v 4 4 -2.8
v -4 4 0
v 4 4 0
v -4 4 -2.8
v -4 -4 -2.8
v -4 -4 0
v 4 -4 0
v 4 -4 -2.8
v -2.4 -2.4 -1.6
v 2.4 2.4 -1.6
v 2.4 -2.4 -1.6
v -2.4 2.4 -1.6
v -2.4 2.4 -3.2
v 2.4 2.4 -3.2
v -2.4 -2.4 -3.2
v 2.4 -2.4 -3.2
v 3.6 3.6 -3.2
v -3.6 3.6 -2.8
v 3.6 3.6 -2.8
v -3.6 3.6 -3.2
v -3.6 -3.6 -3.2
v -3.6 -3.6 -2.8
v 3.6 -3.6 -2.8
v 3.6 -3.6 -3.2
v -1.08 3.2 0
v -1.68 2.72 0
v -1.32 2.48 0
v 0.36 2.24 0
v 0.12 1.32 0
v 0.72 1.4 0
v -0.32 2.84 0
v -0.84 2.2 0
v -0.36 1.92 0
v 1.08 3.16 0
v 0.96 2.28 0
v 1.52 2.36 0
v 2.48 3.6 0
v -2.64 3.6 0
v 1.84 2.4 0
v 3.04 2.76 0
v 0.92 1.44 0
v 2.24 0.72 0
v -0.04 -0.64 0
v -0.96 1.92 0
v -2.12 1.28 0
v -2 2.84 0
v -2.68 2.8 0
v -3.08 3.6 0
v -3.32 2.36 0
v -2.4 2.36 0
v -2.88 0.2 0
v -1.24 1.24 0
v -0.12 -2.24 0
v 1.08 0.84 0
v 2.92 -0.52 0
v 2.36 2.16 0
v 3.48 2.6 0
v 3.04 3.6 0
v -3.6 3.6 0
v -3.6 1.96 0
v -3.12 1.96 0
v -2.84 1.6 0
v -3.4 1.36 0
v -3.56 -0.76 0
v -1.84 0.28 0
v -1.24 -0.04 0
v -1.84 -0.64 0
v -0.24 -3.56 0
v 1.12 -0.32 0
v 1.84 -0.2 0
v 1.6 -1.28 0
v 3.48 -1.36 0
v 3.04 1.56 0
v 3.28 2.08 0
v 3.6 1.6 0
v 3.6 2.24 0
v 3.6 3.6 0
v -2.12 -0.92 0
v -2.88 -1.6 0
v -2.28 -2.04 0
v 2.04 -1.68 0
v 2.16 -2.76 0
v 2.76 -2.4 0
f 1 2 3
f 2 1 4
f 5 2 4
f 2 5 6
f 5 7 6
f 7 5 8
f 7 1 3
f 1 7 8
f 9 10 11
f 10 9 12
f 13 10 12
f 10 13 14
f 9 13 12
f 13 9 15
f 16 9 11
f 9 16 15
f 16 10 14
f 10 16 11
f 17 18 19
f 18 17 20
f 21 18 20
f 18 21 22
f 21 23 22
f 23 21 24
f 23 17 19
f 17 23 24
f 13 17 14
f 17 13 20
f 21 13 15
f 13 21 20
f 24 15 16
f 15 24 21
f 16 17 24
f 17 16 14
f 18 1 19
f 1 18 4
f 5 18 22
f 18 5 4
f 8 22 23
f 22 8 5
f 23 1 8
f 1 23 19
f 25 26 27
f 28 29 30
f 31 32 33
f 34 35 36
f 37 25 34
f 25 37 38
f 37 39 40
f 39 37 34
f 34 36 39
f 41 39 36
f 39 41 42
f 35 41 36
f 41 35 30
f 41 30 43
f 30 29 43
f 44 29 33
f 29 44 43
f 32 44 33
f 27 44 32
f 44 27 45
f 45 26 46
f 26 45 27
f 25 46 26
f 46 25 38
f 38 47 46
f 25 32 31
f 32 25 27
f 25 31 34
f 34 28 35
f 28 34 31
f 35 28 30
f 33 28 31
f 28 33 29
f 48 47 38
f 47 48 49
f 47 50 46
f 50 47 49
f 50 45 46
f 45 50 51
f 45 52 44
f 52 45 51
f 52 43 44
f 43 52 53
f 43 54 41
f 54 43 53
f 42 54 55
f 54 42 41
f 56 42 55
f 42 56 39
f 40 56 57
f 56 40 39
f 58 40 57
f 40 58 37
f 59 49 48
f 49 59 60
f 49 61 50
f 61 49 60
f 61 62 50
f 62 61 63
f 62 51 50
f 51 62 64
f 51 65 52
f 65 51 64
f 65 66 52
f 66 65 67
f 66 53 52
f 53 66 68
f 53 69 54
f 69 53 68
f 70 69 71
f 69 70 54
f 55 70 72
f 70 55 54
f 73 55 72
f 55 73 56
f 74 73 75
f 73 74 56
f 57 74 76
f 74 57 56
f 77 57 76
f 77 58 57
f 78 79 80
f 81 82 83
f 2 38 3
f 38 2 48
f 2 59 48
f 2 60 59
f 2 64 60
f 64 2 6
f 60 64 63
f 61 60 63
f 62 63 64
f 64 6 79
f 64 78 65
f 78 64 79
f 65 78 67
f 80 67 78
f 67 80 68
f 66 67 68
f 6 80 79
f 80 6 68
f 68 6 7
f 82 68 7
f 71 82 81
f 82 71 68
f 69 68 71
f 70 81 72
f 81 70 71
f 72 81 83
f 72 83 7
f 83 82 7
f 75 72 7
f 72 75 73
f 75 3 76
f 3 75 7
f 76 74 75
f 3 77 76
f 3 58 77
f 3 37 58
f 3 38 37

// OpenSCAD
// file: ../p/box5.scad
use <../lib.scad>
function ldraw_lib__box5() = [
// 0 Box with 5 Faces and All Edges
// 0 Name: box5.dat
// 0 Author: James Jessiman
// 0 !LDRAW_ORG Primitive UPDATE 2012-01
// 0 !LICENSE Licensed under CC BY 4.0 : see CAreadme.txt
// 
// 0 BFC CERTIFY CCW
  [0,"BFC","CERTIFY"],
  [0,"BFC","CCW"],
// 
// 0 !HISTORY 2002-04-03 [sbliss] Modified for BFC compliance
// 0 !HISTORY 2002-04-25 [PTadmin] Official Update 2002-02
// 0 !HISTORY 2007-06-24 [PTadmin] Header formatted for Contributor Agreement
// 0 !HISTORY 2008-07-01 [PTadmin] Official Update 2008-01
// 0 !HISTORY 2012-02-16 [Philo] Changed to CCW
// 0 !HISTORY 2012-03-30 [PTadmin] Official Update 2012-01
// 
// 
// 2 24 1 1 1 -1 1 1
  [2,24,1,1,1,-1,1,1],
// 2 24 -1 1 1 -1 1 -1
  [2,24,-1,1,1,-1,1,-1],
// 2 24 -1 1 -1 1 1 -1
  [2,24,-1,1,-1,1,1,-1],
// 2 24 1 1 -1 1 1 1
  [2,24,1,1,-1,1,1,1],
// 2 24 1 0 1 -1 0 1
  [2,24,1,0,1,-1,0,1],
// 2 24 -1 0 1 -1 0 -1
  [2,24,-1,0,1,-1,0,-1],
// 2 24 -1 0 -1 1 0 -1
  [2,24,-1,0,-1,1,0,-1],
// 2 24 1 0 -1 1 0 1
  [2,24,1,0,-1,1,0,1],
// 2 24 1 0 1 1 1 1
  [2,24,1,0,1,1,1,1],
// 2 24 -1 0 1 -1 1 1
  [2,24,-1,0,1,-1,1,1],
// 2 24 1 0 -1 1 1 -1
  [2,24,1,0,-1,1,1,-1],
// 2 24 -1 0 -1 -1 1 -1
  [2,24,-1,0,-1,-1,1,-1],
// 4 16 -1 1 1 1 1 1 1 1 -1 -1 1 -1
  [4,16,-1,1,1,1,1,1,1,1,-1,-1,1,-1],
// 4 16 -1 1 1 -1 0 1 1 0 1 1 1 1
  [4,16,-1,1,1,-1,0,1,1,0,1,1,1,1],
// 4 16 -1 1 -1 -1 0 -1 -1 0 1 -1 1 1
  [4,16,-1,1,-1,-1,0,-1,-1,0,1,-1,1,1],
// 4 16 1 1 -1 1 0 -1 -1 0 -1 -1 1 -1
  [4,16,1,1,-1,1,0,-1,-1,0,-1,-1,1,-1],
// 4 16 1 1 1 1 0 1 1 0 -1 1 1 -1
  [4,16,1,1,1,1,0,1,1,0,-1,1,1,-1],
];
module ldraw_lib__box5(step=0, col=false, unit=2/5, alt=false, line=0.2, solid=!$preview)
    makepoly(ldraw_lib__box5(), step=step, col=col, unit=unit, alt=alt, line=line, solid=solid);
ldraw_lib__box5(line=0.2);
// file: ../p/box4.scad
use <../lib.scad>
function ldraw_lib__box4() = [
// 0 Box with 4 Faces (2 Parallel Pairs) and All Edges
// 0 Name: box4.dat
// 0 Author: James Jessiman
// 0 !LDRAW_ORG Primitive UPDATE 2012-01
// 0 !LICENSE Licensed under CC BY 4.0 : see CAreadme.txt
// 
// 0 BFC CERTIFY CCW
  [0,"BFC","CERTIFY"],
  [0,"BFC","CCW"],
// 
// 0 !HISTORY 2002-04-03 [sbliss] Modified for BFC compliance
// 0 !HISTORY 2002-04-25 [PTadmin] Official Update 2002-02
// 0 !HISTORY 2007-06-24 [PTadmin] Header formatted for Contributor Agreement
// 0 !HISTORY 2008-07-01 [PTadmin] Official Update 2008-01
// 0 !HISTORY 2012-02-16 [Philo] Changed to CCW
// 0 !HISTORY 2012-03-30 [PTadmin] Official Update 2012-01
// 
// 
// 2 24 1 1 1 -1 1 1
  [2,24,1,1,1,-1,1,1],
// 2 24 -1 1 1 -1 1 -1
  [2,24,-1,1,1,-1,1,-1],
// 2 24 -1 1 -1 1 1 -1
  [2,24,-1,1,-1,1,1,-1],
// 2 24 1 1 -1 1 1 1
  [2,24,1,1,-1,1,1,1],
// 2 24 1 0 1 -1 0 1
  [2,24,1,0,1,-1,0,1],
// 2 24 -1 0 1 -1 0 -1
  [2,24,-1,0,1,-1,0,-1],
// 2 24 -1 0 -1 1 0 -1
  [2,24,-1,0,-1,1,0,-1],
// 2 24 1 0 -1 1 0 1
  [2,24,1,0,-1,1,0,1],
// 2 24 1 0 1 1 1 1
  [2,24,1,0,1,1,1,1],
// 2 24 -1 0 1 -1 1 1
  [2,24,-1,0,1,-1,1,1],
// 2 24 1 0 -1 1 1 -1
  [2,24,1,0,-1,1,1,-1],
// 2 24 -1 0 -1 -1 1 -1
  [2,24,-1,0,-1,-1,1,-1],
// 4 16 -1 1 1 -1 0 1 1 0 1 1 1 1
  [4,16,-1,1,1,-1,0,1,1,0,1,1,1,1],
// 4 16 -1 1 -1 -1 0 -1 -1 0 1 -1 1 1
  [4,16,-1,1,-1,-1,0,-1,-1,0,1,-1,1,1],
// 4 16 1 1 -1 1 0 -1 -1 0 -1 -1 1 -1
  [4,16,1,1,-1,1,0,-1,-1,0,-1,-1,1,-1],
// 4 16 1 1 1 1 0 1 1 0 -1 1 1 -1
  [4,16,1,1,1,1,0,1,1,0,-1,1,1,-1],
];
module ldraw_lib__box4(step=0, col=false, unit=2/5, alt=false, line=0.2, solid=!$preview)
    makepoly(ldraw_lib__box4(), step=step, col=col, unit=unit, alt=alt, line=line, solid=solid);
ldraw_lib__box4(line=0.2);
// file: s/3070bs01.scad
use <../../lib.scad>
use <../../p/box4.scad>
use <../../p/box5.scad>
function ldraw_lib__s__3070bs01() = [
// 0 ~Tile  1 x  1 with Groove without Top Face
// 0 Name: s\3070bs01.dat
// 0 Author: Chris Dee [cwdee]
// 0 !LDRAW_ORG Subpart UPDATE 2009-02
// 0 !LICENSE Licensed under CC BY 4.0 : see CAreadme.txt
// 
// 0 BFC CERTIFY CCW
  [0,"BFC","CERTIFY"],
  [0,"BFC","CCW"],
// 
// 0 !HISTORY 2009-09-03 [PTadmin] Official Update 2009-02
// 
// 
// 1 16 0 0 0 10 0 0 0 7 0 0 0 10 box4.dat
  [1,16,0,0,0,10,0,0,0,7,0,0,0,10, ldraw_lib__box4()],
// 0 BFC INVERTNEXT
  [0,"BFC","INVERTNEXT"],
// 1 16 0 8 0 6 0 0 0 -4 0 0 0 6 box5.dat
  [1,16,0,8,0,6,0,0,0,-4,0,0,0,6, ldraw_lib__box5()],
// 1 16 0 7 0 9 0 0 0 1 0 0 0 9 box4.dat
  [1,16,0,7,0,9,0,0,0,1,0,0,0,9, ldraw_lib__box4()],
// 
// 4 16 9 8 9 6 8 6 -6 8 6 -9 8 9
  [4,16,9,8,9,6,8,6,-6,8,6,-9,8,9],
// 4 16 -9 8 9 -6 8 6 -6 8 -6 -9 8 -9
  [4,16,-9,8,9,-6,8,6,-6,8,-6,-9,8,-9],
// 4 16 -9 8 -9 -6 8 -6 6 8 -6 9 8 -9
  [4,16,-9,8,-9,-6,8,-6,6,8,-6,9,8,-9],
// 4 16 9 8 -9 6 8 -6 6 8 6 9 8 9
  [4,16,9,8,-9,6,8,-6,6,8,6,9,8,9],
// 
// 4 16 10 7 10 9 7 9 -9 7 9 -10 7 10
  [4,16,10,7,10,9,7,9,-9,7,9,-10,7,10],
// 4 16 -10 7 10 -9 7 9 -9 7 -9 -10 7 -10
  [4,16,-10,7,10,-9,7,9,-9,7,-9,-10,7,-10],
// 4 16 -10 7 -10 -9 7 -9 9 7 -9 10 7 -10
  [4,16,-10,7,-10,-9,7,-9,9,7,-9,10,7,-10],
// 4 16 10 7 -10 9 7 -9 9 7 9 10 7 10
  [4,16,10,7,-10,9,7,-9,9,7,9,10,7,10],
// 0
];
module ldraw_lib__s__3070bs01(step=0, col=false, unit=2/5, alt=false, line=0.2, solid=!$preview)
    makepoly(ldraw_lib__s__3070bs01(), step=step, col=col, unit=unit, alt=alt, line=line, solid=solid);
ldraw_lib__s__3070bs01(line=0.2);
// main file
use <../lib.scad>
use <s/3070bs01.scad>
function ldraw_lib__3070bp1b() = [
// 0 Tile  1 x  1 with Metallic Pink, White, and Yellow Explosion Pattern
// 0 Name: 3070bp1b.dat
// 0 Author: Takeshi Takahashi [RainbowDolphin]
// 0 !LDRAW_ORG Part UPDATE 2023-03
// 0 !LICENSE Licensed under CC BY 4.0 : see CAreadme.txt
// 
// 0 BFC CERTIFY CCW
  [0,"BFC","CERTIFY"],
  [0,"BFC","CCW"],
// 
// 0 !KEYWORDS bracelet, Bricklink 3070bpb165, Dots, Power, Set 41919
// 
// 0 !HISTORY 2023-06-24 [OrionP] Official Update 2023-03
// 
// 
// 1 16 0 0 0 1 0 0 0 1 0 0 0 1 s\3070bs01.dat
  [1,16,0,0,0,1,0,0,0,1,0,0,0,1, ldraw_lib__s__3070bs01()],
// 3 15 -2.7 0 8 -4.2 0 6.8 -3.3 0 6.2
  [3,15,-2.7,0,8,-4.2,0,6.8,-3.3,0,6.2],
// 3 15 0.9 0 5.6 0.3 0 3.3 1.8 0 3.5
  [3,15,0.9,0,5.6,0.3,0,3.3,1.8,0,3.5],
// 3 353 -0.8 0 7.1 -2.1 0 5.5 -0.9 0 4.8
  [3,353,-0.8,0,7.1,-2.1,0,5.5,-0.9,0,4.8],
// 3 353 2.7 0 7.9 2.4 0 5.7 3.8 0 5.9
  [3,353,2.7,0,7.9,2.4,0,5.7,3.8,0,5.9],
// 4 14 6.2 0 9 -6.6 0 9 -2.7 0 8 2.7 0 7.9
  [4,14,6.2,0,9,-6.6,0,9,-2.7,0,8,2.7,0,7.9],
// 4 14 7.6 0 6.9 6.2 0 9 2.7 0 7.9 4.6 0 6
  [4,14,7.6,0,6.9,6.2,0,9,2.7,0,7.9,4.6,0,6],
// 3 14 2.7 0 7.9 3.8 0 5.9 4.6 0 6
  [3,14,2.7,0,7.9,3.8,0,5.9,4.6,0,6],
// 4 14 5.6 0 1.8 4.6 0 6 3.8 0 5.9 2.3 0 3.6
  [4,14,5.6,0,1.8,4.6,0,6,3.8,0,5.9,2.3,0,3.6],
// 4 14 2.3 0 3.6 3.8 0 5.9 2.4 0 5.7 1.8 0 3.5
  [4,14,2.3,0,3.6,3.8,0,5.9,2.4,0,5.7,1.8,0,3.5],
// 3 14 2.3 0 3.6 1.8 0 3.5 -0.1 0 -1.6
  [3,14,2.3,0,3.6,1.8,0,3.5,-0.1,0,-1.6],
// 3 14 1.8 0 3.5 0.3 0 3.3 -0.1 0 -1.6
  [3,14,1.8,0,3.5,0.3,0,3.3,-0.1,0,-1.6],
// 4 14 -0.1 0 -1.6 0.3 0 3.3 -0.9 0 4.8 -2.4 0 4.8
  [4,14,-0.1,0,-1.6,0.3,0,3.3,-0.9,0,4.8,-2.4,0,4.8],
// 3 14 -2.1 0 5.5 -2.4 0 4.8 -0.9 0 4.8
  [3,14,-2.1,0,5.5,-2.4,0,4.8,-0.9,0,4.8],
// 4 14 -2.4 0 4.8 -2.1 0 5.5 -3.3 0 6.2 -5.3 0 3.2
  [4,14,-2.4,0,4.8,-2.1,0,5.5,-3.3,0,6.2,-5.3,0,3.2],
// 4 14 -5.3 0 3.2 -3.3 0 6.2 -4.2 0 6.8 -5 0 7.1
  [4,14,-5.3,0,3.2,-3.3,0,6.2,-4.2,0,6.8,-5,0,7.1],
// 4 14 -5 0 7.1 -4.2 0 6.8 -2.7 0 8 -6.6 0 9
  [4,14,-5,0,7.1,-4.2,0,6.8,-2.7,0,8,-6.6,0,9],
// 3 14 -6.6 0 9 -6.7 0 7 -5 0 7.1
  [3,14,-6.6,0,9,-6.7,0,7,-5,0,7.1],
// 4 14 -2.7 0 8 -3.3 0 6.2 -2.1 0 5.5 -0.8 0 7.1
  [4,14,-2.7,0,8,-3.3,0,6.2,-2.1,0,5.5,-0.8,0,7.1],
// 3 14 -2.7 0 8 -0.8 0 7.1 2.7 0 7.9
  [3,14,-2.7,0,8,-0.8,0,7.1,2.7,0,7.9],
// 4 14 2.7 0 7.9 -0.8 0 7.1 0.9 0 5.6 2.4 0 5.7
  [4,14,2.7,0,7.9,-0.8,0,7.1,0.9,0,5.6,2.4,0,5.7],
// 3 14 2.4 0 5.7 0.9 0 5.6 1.8 0 3.5
  [3,14,2.4,0,5.7,0.9,0,5.6,1.8,0,3.5],
// 4 14 0.9 0 5.6 -0.8 0 7.1 -0.9 0 4.8 0.3 0 3.3
  [4,14,0.9,0,5.6,-0.8,0,7.1,-0.9,0,4.8,0.3,0,3.3],
// 4 15 -6.7 0 7 -6.6 0 9 -7.7 0 9 -8.3 0 5.9
  [4,15,-6.7,0,7,-6.6,0,9,-7.7,0,9,-8.3,0,5.9],
// 4 15 -6.7 0 7 -8.3 0 5.9 -6 0 5.9 -5 0 7.1
  [4,15,-6.7,0,7,-8.3,0,5.9,-6,0,5.9,-5,0,7.1],
// 4 15 -5.3 0 3.2 -5 0 7.1 -6 0 5.9 -7.2 0 0.5
  [4,15,-5.3,0,3.2,-5,0,7.1,-6,0,5.9,-7.2,0,0.5],
// 4 15 -5.3 0 3.2 -7.2 0 0.5 -3.1 0 3.1 -2.4 0 4.8
  [4,15,-5.3,0,3.2,-7.2,0,0.5,-3.1,0,3.1,-2.4,0,4.8],
// 4 15 -0.1 0 -1.6 -2.4 0 4.8 -3.1 0 3.1 -0.3 0 -5.6
  [4,15,-0.1,0,-1.6,-2.4,0,4.8,-3.1,0,3.1,-0.3,0,-5.6],
// 4 15 -0.1 0 -1.6 -0.3 0 -5.6 2.7 0 2.1 2.3 0 3.6
  [4,15,-0.1,0,-1.6,-0.3,0,-5.6,2.7,0,2.1,2.3,0,3.6],
// 4 15 5.6 0 1.8 2.3 0 3.6 2.7 0 2.1 7.3 0 -1.3
  [4,15,5.6,0,1.8,2.3,0,3.6,2.7,0,2.1,7.3,0,-1.3],
// 4 15 5.6 0 1.8 7.3 0 -1.3 5.9 0 5.4 4.6 0 6
  [4,15,5.6,0,1.8,7.3,0,-1.3,5.9,0,5.4,4.6,0,6],
// 4 15 7.6 0 6.9 4.6 0 6 5.9 0 5.4 8.7 0 6.5
  [4,15,7.6,0,6.9,4.6,0,6,5.9,0,5.4,8.7,0,6.5],
// 4 15 7.6 0 6.9 8.7 0 6.5 7.6 0 9 6.2 0 9
  [4,15,7.6,0,6.9,8.7,0,6.5,7.6,0,9,6.2,0,9],
// 4 10049 -8.3 0 5.9 -7.7 0 9 -9 0 9 -9 0 4.9
  [4,10049,-8.3,0,5.9,-7.7,0,9,-9,0,9,-9,0,4.9],
// 4 10049 -8.3 0 5.9 -9 0 4.9 -7.8 0 4.9 -6 0 5.9
  [4,10049,-8.3,0,5.9,-9,0,4.9,-7.8,0,4.9,-6,0,5.9],
// 4 10049 -7.1 0 4 -6 0 5.9 -7.8 0 4.9 -8.5 0 3.4
  [4,10049,-7.1,0,4,-6,0,5.9,-7.8,0,4.9,-8.5,0,3.4],
// 4 10049 -7.2 0 .5 -6 0 5.9 -7.1 0 4 -8.9 0 -1.9
  [4,10049,-7.2,0,.5,-6,0,5.9,-7.1,0,4,-8.9,0,-1.9],
// 4 10049 -7.2 0 .5 -8.9 0 -1.9 -4.6 0 .7 -3.1 0 3.1
  [4,10049,-7.2,0,.5,-8.9,0,-1.9,-4.6,0,.7,-3.1,0,3.1],
// 4 10049 -3.1 0 -.1 -3.1 0 3.1 -4.6 0 .7 -4.6 0 -1.6
  [4,10049,-3.1,0,-.1,-3.1,0,3.1,-4.6,0,.7,-4.6,0,-1.6],
// 4 10049 -.3 0 -5.6 -3.1 0 3.1 -3.1 0 -.1 -.6 0 -8.9
  [4,10049,-.3,0,-5.6,-3.1,0,3.1,-3.1,0,-.1,-.6,0,-8.9],
// 4 10049 -.3 0 -5.6 -.6 0 -8.9 2.8 0 -.8 2.7 0 2.1
  [4,10049,-.3,0,-5.6,-.6,0,-8.9,2.8,0,-.8,2.7,0,2.1],
// 4 10049 4.6 0 -.5 2.7 0 2.1 2.8 0 -.8 4 0 -3.2
  [4,10049,4.6,0,-.5,2.7,0,2.1,2.8,0,-.8,4,0,-3.2],
// 4 10049 7.3 0 -1.3 2.7 0 2.1 4.6 0 -.5 8.7 0 -3.4
  [4,10049,7.3,0,-1.3,2.7,0,2.1,4.6,0,-.5,8.7,0,-3.4],
// 4 10049 7.3 0 -1.3 8.7 0 -3.4 7.6 0 3.9 5.9 0 5.4
  [4,10049,7.3,0,-1.3,8.7,0,-3.4,7.6,0,3.9,5.9,0,5.4],
// 4 10049 8.2 0 5.2 5.9 0 5.4 7.6 0 3.9 9 0 4
  [4,10049,8.2,0,5.2,5.9,0,5.4,7.6,0,3.9,9,0,4],
// 4 10049 8.7 0 6.5 5.9 0 5.4 8.2 0 5.2 9 0 5.6
  [4,10049,8.7,0,6.5,5.9,0,5.4,8.2,0,5.2,9,0,5.6],
// 3 10049 9 0 9 8.7 0 6.5 9 0 5.6
  [3,10049,9,0,9,8.7,0,6.5,9,0,5.6],
// 3 10049 9 0 9 7.6 0 9 8.7 0 6.5
  [3,10049,9,0,9,7.6,0,9,8.7,0,6.5],
// 3 10049 -5.3 0 -2.3 -7.2 0 -4 -5.7 0 -5.1
  [3,10049,-5.3,0,-2.3,-7.2,0,-4,-5.7,0,-5.1],
// 3 10049 5.1 0 -4.2 5.4 0 -6.9 6.9 0 -6
  [3,10049,5.1,0,-4.2,5.4,0,-6.9,6.9,0,-6],
// 4 16 -6.6 0 9 10 0 10 -10 0 10 -7.7 0 9
  [4,16,-6.6,0,9,10,0,10,-10,0,10,-7.7,0,9],
// 3 16 -10 0 10 -9 0 9 -7.7 0 9
  [3,16,-10,0,10,-9,0,9,-7.7,0,9],
// 3 16 -10 0 10 -9 0 4.9 -9 0 9
  [3,16,-10,0,10,-9,0,4.9,-9,0,9],
// 4 16 -8.9 0 -1.9 -9 0 4.9 -10 0 10 -10 0 -10
  [4,16,-8.9,0,-1.9,-9,0,4.9,-10,0,10,-10,0,-10],
// 3 16 -9 0 4.9 -8.9 0 -1.9 -8.5 0 3.4
  [3,16,-9,0,4.9,-8.9,0,-1.9,-8.5,0,3.4],
// 3 16 -7.8 0 4.9 -9 0 4.9 -8.5 0 3.4
  [3,16,-7.8,0,4.9,-9,0,4.9,-8.5,0,3.4],
// 3 16 -7.1 0 4 -8.5 0 3.4 -8.9 0 -1.9
  [3,16,-7.1,0,4,-8.5,0,3.4,-8.9,0,-1.9],
// 3 16 -8.9 0 -1.9 -10 0 -10 -7.2 0 -4
  [3,16,-8.9,0,-1.9,-10,0,-10,-7.2,0,-4],
// 4 16 -8.9 0 -1.9 -7.2 0 -4 -5.3 0 -2.3 -4.6 0 0.7
  [4,16,-8.9,0,-1.9,-7.2,0,-4,-5.3,0,-2.3,-4.6,0,0.7],
// 3 16 -4.6 0 0.7 -5.3 0 -2.3 -4.6 0 -1.6
  [3,16,-4.6,0,0.7,-5.3,0,-2.3,-4.6,0,-1.6],
// 4 16 -0.6 0 -8.9 -4.6 0 -1.6 -5.3 0 -2.3 -5.7 0 -5.1
  [4,16,-0.6,0,-8.9,-4.6,0,-1.6,-5.3,0,-2.3,-5.7,0,-5.1],
// 3 16 -3.1 0 -0.1 -4.6 0 -1.6 -0.6 0 -8.9
  [3,16,-3.1,0,-0.1,-4.6,0,-1.6,-0.6,0,-8.9],
// 4 16 -10 0 -10 -0.6 0 -8.9 -5.7 0 -5.1 -7.2 0 -4
  [4,16,-10,0,-10,-0.6,0,-8.9,-5.7,0,-5.1,-7.2,0,-4],
// 3 16 -0.6 0 -8.9 -10 0 -10 10 0 -10
  [3,16,-0.6,0,-8.9,-10,0,-10,10,0,-10],
// 3 16 5.4 0 -6.9 -0.6 0 -8.9 10 0 -10
  [3,16,5.4,0,-6.9,-0.6,0,-8.9,10,0,-10],
// 4 16 -0.6 0 -8.9 5.4 0 -6.9 5.1 0 -4.2 4 0 -3.2
  [4,16,-0.6,0,-8.9,5.4,0,-6.9,5.1,0,-4.2,4,0,-3.2],
// 3 16 2.8 0 -0.8 -0.6 0 -8.9 4 0 -3.2
  [3,16,2.8,0,-0.8,-0.6,0,-8.9,4,0,-3.2],
// 4 16 4.6 0 -0.5 4 0 -3.2 5.1 0 -4.2 8.7 0 -3.4
  [4,16,4.6,0,-0.5,4,0,-3.2,5.1,0,-4.2,8.7,0,-3.4],
// 3 16 8.7 0 -3.4 5.1 0 -4.2 6.9 0 -6
  [3,16,8.7,0,-3.4,5.1,0,-4.2,6.9,0,-6],
// 3 16 8.7 0 -3.4 6.9 0 -6 10 0 -10
  [3,16,8.7,0,-3.4,6.9,0,-6,10,0,-10],
// 3 16 6.9 0 -6 5.4 0 -6.9 10 0 -10
  [3,16,6.9,0,-6,5.4,0,-6.9,10,0,-10],
// 4 16 8.7 0 -3.4 10 0 -10 9 0 4 7.6 0 3.9
  [4,16,8.7,0,-3.4,10,0,-10,9,0,4,7.6,0,3.9],
// 4 16 9 0 4 10 0 -10 10 0 10 9 0 5.6
  [4,16,9,0,4,10,0,-10,10,0,10,9,0,5.6],
// 3 16 9 0 5.6 8.2 0 5.2 9 0 4
  [3,16,9,0,5.6,8.2,0,5.2,9,0,4],
// 3 16 10 0 10 9 0 9 9 0 5.6
  [3,16,10,0,10,9,0,9,9,0,5.6],
// 3 16 10 0 10 7.6 0 9 9 0 9
  [3,16,10,0,10,7.6,0,9,9,0,9],
// 3 16 10 0 10 6.2 0 9 7.6 0 9
  [3,16,10,0,10,6.2,0,9,7.6,0,9],
// 3 16 10 0 10 -6.6 0 9 6.2 0 9
  [3,16,10,0,10,-6.6,0,9,6.2,0,9],
];
module ldraw_lib__3070bp1b(step=0, col=false, unit=2/5, alt=false, line=0.2, solid=!$preview)
    makepoly(ldraw_lib__3070bp1b(), step=step, col=col, unit=unit, alt=alt, line=line, solid=solid);
ldraw_lib__3070bp1b(line=0.2);
